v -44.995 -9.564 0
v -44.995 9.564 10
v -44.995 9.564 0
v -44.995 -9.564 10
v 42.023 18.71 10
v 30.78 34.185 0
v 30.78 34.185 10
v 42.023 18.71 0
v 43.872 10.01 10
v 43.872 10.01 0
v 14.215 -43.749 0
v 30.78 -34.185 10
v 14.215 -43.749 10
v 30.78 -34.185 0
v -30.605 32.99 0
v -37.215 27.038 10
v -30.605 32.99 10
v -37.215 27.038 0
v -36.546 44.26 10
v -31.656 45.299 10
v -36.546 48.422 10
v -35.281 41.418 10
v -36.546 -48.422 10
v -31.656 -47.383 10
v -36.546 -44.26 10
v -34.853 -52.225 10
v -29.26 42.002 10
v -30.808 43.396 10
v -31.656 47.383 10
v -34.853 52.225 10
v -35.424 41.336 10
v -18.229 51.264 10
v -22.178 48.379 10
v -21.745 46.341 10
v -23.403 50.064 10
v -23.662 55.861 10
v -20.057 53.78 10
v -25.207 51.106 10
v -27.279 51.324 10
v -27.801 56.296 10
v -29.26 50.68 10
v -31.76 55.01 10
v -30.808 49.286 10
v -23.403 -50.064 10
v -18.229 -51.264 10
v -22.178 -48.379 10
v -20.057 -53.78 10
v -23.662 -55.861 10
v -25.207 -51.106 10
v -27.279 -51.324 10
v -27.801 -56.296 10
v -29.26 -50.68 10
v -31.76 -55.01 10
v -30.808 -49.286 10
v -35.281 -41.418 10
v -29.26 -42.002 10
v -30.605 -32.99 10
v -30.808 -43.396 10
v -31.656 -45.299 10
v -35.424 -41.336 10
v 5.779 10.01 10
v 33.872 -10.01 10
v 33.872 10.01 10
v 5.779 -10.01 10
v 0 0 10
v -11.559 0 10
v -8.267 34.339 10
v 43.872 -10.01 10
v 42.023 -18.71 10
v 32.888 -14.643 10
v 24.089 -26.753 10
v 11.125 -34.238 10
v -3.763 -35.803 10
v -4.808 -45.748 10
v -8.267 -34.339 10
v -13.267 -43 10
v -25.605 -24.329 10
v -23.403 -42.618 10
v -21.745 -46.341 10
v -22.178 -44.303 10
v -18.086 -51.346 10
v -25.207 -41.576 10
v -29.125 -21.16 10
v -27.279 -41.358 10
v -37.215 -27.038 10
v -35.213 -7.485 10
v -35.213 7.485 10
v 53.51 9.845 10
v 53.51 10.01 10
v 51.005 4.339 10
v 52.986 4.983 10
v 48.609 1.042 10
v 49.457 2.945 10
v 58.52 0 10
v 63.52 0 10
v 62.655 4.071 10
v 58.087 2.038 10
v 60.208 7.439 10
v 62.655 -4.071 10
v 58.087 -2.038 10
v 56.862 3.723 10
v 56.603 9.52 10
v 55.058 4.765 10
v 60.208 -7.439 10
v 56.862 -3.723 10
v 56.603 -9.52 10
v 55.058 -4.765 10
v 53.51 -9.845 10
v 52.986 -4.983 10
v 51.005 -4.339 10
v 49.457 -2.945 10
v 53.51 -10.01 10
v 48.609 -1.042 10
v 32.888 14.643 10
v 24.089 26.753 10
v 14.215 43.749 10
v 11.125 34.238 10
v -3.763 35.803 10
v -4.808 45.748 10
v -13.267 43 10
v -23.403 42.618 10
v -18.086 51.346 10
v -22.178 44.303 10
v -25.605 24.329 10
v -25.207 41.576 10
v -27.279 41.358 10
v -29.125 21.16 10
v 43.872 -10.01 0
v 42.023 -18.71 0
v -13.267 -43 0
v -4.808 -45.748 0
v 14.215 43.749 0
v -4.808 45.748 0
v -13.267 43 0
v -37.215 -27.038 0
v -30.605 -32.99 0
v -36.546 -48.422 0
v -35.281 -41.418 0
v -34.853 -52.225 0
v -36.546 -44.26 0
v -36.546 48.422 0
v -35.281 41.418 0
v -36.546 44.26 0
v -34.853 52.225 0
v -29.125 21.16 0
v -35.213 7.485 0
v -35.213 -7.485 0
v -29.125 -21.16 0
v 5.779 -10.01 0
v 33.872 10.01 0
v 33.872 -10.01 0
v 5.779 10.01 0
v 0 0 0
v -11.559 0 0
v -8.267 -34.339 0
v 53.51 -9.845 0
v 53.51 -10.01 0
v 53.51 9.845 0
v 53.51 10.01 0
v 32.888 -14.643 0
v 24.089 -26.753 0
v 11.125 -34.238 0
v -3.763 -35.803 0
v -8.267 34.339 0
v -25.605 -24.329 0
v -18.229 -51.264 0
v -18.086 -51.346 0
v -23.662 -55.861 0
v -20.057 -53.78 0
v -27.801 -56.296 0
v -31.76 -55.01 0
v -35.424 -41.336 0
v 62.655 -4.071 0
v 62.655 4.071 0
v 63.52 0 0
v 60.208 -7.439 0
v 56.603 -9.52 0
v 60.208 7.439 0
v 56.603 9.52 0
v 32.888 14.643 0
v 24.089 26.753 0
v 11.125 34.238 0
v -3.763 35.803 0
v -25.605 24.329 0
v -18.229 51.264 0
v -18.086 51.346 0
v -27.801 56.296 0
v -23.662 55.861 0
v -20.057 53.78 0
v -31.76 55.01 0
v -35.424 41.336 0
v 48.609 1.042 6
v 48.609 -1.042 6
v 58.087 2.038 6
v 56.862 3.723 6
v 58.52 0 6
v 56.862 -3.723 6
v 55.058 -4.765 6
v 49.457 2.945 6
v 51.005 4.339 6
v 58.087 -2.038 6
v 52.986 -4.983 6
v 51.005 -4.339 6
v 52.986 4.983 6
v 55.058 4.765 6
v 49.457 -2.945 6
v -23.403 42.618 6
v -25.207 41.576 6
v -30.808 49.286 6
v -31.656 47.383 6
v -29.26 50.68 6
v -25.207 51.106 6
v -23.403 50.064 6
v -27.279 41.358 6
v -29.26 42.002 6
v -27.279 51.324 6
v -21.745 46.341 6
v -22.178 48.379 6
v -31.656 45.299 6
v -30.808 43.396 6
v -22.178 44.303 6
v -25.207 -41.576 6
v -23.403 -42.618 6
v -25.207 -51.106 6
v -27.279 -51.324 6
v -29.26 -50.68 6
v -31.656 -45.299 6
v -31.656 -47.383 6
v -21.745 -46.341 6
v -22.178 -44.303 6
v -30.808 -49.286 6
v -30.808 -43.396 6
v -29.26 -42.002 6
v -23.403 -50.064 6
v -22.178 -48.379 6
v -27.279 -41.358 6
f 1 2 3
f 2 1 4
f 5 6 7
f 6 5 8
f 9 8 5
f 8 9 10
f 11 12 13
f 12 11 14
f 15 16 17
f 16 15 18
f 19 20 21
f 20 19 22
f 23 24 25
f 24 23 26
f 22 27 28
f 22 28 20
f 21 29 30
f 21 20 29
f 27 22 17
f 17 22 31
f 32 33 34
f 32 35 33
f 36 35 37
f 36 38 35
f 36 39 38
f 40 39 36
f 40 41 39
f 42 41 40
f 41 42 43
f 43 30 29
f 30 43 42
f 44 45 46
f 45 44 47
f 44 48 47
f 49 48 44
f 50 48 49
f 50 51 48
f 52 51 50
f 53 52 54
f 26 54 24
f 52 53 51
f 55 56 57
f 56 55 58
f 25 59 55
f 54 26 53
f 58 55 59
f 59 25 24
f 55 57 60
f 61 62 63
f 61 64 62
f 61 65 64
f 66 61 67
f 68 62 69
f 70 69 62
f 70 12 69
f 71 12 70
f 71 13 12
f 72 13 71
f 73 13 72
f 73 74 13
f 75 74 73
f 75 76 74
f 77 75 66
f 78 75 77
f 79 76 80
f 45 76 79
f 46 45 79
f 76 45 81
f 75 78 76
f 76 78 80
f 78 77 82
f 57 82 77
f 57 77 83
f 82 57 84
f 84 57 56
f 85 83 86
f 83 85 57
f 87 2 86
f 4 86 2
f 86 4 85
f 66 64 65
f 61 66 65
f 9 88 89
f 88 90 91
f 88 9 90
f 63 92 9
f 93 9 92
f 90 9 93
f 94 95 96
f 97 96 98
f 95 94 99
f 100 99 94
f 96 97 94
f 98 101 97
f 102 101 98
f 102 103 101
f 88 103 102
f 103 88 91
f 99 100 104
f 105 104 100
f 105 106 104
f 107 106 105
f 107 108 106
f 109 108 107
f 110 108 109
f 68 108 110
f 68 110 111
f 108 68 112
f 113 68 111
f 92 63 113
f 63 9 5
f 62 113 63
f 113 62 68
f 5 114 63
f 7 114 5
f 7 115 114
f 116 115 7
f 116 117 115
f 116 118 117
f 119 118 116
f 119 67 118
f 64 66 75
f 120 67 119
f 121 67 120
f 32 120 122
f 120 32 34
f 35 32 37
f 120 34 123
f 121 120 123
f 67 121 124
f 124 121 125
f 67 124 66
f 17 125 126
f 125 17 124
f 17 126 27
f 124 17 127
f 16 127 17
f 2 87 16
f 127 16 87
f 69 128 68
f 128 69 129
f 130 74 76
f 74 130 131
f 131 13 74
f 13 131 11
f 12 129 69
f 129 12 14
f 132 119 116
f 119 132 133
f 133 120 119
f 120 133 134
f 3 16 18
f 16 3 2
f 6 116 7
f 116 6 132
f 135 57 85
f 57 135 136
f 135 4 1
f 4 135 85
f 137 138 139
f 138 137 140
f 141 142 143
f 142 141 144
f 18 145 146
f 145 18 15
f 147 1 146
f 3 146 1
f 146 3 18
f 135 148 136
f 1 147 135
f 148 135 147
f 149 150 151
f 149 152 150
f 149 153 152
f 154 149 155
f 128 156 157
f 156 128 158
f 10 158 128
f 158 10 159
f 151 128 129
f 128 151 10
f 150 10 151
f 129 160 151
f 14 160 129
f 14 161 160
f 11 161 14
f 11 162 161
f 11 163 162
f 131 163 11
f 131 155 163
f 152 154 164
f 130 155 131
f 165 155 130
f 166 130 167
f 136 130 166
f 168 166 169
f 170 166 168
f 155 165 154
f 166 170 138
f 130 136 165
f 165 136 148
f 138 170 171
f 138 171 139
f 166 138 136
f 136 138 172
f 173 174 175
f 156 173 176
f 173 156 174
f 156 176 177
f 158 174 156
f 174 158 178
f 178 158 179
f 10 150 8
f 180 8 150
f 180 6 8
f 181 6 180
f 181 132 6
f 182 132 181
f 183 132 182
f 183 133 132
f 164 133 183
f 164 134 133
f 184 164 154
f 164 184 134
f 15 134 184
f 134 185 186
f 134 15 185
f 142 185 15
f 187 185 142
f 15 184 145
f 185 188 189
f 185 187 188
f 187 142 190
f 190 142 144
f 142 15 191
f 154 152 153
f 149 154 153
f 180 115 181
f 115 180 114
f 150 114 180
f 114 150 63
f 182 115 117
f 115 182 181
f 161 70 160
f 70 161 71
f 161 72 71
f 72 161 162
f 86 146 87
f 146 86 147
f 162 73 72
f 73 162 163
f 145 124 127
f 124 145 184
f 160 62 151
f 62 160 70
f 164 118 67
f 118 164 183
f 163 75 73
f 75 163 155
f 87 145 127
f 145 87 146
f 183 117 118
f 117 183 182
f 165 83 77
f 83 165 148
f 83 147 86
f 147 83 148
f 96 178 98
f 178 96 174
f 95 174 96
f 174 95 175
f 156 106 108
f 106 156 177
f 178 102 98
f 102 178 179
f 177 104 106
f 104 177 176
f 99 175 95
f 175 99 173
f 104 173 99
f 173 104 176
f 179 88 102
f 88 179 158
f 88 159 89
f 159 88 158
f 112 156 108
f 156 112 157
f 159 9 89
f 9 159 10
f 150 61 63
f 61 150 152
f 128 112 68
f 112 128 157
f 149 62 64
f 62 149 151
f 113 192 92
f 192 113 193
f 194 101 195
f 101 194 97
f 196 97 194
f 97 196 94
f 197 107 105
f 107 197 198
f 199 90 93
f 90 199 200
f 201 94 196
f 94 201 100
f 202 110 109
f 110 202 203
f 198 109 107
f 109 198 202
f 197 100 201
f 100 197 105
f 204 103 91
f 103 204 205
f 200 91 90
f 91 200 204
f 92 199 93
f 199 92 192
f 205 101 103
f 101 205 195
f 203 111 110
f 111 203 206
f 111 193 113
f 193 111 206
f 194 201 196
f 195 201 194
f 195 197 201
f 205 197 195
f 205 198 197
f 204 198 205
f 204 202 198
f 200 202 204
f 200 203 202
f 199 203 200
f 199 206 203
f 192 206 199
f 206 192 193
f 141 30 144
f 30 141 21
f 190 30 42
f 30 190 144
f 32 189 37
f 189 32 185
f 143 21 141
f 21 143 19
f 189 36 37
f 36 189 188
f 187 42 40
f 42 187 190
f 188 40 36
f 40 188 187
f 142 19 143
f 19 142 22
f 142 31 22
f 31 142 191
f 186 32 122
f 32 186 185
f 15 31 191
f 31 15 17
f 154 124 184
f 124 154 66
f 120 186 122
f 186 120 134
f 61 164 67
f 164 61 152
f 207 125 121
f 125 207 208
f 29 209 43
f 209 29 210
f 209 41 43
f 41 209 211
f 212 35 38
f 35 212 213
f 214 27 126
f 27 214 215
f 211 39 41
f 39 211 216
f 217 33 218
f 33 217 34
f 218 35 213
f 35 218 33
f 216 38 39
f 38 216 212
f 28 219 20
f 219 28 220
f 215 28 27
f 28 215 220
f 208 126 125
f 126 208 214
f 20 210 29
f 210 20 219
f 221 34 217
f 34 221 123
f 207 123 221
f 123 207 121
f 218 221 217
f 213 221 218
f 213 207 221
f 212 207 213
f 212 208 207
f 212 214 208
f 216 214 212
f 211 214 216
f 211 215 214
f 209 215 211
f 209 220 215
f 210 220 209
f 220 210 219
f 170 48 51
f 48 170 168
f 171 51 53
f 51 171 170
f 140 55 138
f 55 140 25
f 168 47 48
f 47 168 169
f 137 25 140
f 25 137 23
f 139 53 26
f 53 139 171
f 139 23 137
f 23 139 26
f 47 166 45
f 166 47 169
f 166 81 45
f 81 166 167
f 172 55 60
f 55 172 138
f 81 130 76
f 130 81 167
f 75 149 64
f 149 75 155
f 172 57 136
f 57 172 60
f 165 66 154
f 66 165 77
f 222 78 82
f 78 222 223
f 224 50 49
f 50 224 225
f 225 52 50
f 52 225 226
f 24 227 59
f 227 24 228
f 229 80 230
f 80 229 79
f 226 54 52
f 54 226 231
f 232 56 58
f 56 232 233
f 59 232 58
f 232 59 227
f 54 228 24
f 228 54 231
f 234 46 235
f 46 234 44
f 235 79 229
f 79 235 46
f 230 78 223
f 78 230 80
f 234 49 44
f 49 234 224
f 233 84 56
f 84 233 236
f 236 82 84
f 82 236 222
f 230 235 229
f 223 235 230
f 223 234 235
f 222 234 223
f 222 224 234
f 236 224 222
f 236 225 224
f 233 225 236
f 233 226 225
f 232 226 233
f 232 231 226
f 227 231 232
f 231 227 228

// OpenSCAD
unit = 1;
postHolderScale = 0.5;

module Frame(frameR,frameW,frameH,postR,postW,postLipH) {
    frameRout = frameR + frameW / 2;
    frameRin = frameR - frameW / 2;
    framePostOffset = abs(frameW - postW);
    postCenterOffset = frameR + postR + abs(frameW - postW);
    postRout = postR + postW / 2;
    difference() {
        cylinder(r=frameRout,h=frameH);
        cylinder(r=frameRin,h=frameH);
    }
    for(a=[0,120,240]) {
        rotate(a) translate([postCenterOffset,0,0]) difference() {
            union() {                        
                cylinder(r=postRout, h=frameH);
                translate([-postCenterOffset,-postRout,0]) cube(size=[postCenterOffset, 2*postRout,frameH]);
            }
            translate([0,0,postLipH]) cylinder(r=postR - postW/2, h=frameH - postLipH);
        }
    }
}

unit = 1; //cm
frameRadius = 41 * unit;
frameHeight = 10 * unit;
frameWidth = 10 * unit;
postRadius = 5 * unit;
postWidth = 5 * unit;
postLip = 6 * unit;
postHeight = 66 * unit;
finese = 15;
tolerance = 0.01 * unit;

//Top and bottom piece of the frame
Frame(frameRadius,frameWidth,frameHeight,postRadius + tolerance + postWidth/2,postWidth,postLip,$fn=finese);
//Three supports of the frame
//cylinder(r=postRadius - tolerance,h=postHeight,$fn=finese);
